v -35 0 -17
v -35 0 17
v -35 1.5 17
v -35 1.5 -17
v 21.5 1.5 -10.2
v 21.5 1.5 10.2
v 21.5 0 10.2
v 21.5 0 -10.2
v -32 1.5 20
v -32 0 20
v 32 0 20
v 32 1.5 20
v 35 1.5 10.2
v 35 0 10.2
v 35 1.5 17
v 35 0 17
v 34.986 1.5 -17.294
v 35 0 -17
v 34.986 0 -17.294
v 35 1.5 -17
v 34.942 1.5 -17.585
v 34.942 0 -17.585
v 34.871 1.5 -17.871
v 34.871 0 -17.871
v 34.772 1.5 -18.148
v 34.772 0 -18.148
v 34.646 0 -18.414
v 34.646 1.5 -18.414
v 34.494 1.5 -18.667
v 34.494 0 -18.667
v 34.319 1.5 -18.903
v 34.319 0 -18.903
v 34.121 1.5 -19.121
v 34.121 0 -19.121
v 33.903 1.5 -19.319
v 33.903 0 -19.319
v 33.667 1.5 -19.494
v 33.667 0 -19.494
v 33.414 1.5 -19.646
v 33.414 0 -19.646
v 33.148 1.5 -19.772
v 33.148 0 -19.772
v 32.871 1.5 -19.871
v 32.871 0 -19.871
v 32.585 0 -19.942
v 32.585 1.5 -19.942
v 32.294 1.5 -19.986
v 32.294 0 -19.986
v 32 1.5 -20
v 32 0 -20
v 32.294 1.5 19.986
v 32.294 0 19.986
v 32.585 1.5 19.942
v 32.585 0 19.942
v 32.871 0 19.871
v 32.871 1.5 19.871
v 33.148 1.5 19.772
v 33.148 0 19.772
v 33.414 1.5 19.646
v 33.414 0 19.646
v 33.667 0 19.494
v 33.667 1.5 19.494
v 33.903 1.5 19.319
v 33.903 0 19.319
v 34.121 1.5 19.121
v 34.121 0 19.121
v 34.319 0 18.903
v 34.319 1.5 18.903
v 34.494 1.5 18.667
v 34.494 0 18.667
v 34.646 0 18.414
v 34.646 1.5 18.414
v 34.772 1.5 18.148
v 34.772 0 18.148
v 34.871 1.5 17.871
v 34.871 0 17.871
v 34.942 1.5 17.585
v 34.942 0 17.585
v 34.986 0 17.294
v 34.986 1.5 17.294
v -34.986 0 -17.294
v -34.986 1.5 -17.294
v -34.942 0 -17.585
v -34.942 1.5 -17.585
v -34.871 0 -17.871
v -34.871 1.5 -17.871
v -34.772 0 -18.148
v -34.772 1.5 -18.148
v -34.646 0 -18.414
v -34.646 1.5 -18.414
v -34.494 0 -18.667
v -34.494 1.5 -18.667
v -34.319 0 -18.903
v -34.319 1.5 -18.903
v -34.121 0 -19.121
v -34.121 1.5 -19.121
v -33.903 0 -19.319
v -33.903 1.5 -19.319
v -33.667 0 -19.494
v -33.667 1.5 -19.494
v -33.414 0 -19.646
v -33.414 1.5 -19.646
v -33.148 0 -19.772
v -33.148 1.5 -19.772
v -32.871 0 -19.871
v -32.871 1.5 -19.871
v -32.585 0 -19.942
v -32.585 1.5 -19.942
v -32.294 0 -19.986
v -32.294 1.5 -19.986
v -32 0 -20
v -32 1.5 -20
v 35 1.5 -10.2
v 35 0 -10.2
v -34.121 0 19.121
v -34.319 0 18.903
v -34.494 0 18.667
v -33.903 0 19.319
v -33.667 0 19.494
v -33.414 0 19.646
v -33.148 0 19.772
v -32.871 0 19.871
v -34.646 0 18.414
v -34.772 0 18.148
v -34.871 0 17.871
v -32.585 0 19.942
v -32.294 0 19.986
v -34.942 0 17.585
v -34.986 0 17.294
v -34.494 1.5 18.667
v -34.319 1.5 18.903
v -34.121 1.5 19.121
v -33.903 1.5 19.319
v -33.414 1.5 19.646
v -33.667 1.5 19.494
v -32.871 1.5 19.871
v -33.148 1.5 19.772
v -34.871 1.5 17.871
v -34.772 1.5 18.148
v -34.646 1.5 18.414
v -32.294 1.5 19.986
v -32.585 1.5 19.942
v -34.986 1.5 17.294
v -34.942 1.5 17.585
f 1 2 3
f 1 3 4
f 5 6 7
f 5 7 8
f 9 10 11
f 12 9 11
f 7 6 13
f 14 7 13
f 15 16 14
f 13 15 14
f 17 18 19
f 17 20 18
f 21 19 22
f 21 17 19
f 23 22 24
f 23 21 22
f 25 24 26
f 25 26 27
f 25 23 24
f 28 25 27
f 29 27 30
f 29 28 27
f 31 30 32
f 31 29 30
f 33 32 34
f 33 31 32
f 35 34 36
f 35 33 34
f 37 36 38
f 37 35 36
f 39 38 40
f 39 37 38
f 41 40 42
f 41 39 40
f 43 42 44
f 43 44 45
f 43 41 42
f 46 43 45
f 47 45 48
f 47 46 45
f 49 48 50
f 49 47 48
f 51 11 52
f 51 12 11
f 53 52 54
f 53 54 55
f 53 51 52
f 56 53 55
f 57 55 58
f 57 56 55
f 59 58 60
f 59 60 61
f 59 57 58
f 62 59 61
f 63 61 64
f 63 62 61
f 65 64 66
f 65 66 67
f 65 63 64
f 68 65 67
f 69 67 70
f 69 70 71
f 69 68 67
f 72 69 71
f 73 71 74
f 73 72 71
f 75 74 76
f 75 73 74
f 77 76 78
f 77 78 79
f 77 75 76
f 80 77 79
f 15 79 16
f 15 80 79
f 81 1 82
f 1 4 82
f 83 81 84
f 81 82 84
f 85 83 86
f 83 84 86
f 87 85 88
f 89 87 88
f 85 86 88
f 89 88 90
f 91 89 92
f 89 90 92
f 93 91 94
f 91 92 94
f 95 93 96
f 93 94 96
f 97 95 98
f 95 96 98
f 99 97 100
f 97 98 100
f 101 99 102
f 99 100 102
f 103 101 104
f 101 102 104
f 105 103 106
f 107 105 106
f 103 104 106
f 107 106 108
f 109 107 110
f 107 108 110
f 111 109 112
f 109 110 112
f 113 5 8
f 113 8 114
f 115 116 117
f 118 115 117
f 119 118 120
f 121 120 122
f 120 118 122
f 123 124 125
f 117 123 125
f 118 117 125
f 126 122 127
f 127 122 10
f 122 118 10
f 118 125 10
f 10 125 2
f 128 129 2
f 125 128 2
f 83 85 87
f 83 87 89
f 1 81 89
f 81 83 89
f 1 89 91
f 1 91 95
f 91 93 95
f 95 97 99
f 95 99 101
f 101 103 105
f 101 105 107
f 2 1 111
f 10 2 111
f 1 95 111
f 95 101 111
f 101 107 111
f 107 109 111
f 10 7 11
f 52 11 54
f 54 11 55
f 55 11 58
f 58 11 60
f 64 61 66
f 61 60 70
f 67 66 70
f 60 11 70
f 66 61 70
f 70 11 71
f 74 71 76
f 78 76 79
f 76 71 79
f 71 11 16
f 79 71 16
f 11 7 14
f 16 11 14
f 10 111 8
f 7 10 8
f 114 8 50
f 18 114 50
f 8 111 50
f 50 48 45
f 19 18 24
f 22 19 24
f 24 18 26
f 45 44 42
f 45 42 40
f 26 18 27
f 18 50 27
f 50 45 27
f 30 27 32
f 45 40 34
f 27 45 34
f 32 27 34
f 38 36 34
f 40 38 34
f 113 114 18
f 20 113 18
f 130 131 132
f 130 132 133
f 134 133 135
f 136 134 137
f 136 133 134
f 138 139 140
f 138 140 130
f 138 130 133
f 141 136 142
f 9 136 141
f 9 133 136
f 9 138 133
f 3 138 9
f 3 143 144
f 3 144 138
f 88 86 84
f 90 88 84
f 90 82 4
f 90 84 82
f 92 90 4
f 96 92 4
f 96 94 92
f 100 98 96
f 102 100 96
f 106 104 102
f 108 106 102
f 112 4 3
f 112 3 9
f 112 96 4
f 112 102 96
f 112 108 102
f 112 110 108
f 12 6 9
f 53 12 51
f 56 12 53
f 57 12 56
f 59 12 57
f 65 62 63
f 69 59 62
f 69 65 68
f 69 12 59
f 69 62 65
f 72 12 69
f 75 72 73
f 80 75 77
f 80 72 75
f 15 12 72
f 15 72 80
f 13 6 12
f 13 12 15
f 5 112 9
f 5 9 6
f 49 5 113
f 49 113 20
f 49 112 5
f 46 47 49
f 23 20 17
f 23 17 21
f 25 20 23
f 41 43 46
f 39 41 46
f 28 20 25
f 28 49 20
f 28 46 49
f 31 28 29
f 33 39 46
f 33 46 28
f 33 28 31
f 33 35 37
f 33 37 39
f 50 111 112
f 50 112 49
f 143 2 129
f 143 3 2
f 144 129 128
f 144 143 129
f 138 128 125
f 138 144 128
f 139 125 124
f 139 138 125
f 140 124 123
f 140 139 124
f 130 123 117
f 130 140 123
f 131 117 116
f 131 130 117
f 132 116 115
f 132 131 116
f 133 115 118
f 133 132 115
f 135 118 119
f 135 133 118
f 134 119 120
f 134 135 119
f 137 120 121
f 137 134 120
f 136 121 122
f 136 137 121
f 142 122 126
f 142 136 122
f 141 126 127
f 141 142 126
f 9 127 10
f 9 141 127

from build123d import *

# Parameters (mm, degrees)
SKETCH_1_W          = 70
SKETCH_1_H          = 40
EXTRUDE_1_DEPTH     = 1.5
FILLET_1_R          = 3
SKETCH_2_W          = 13.5
SKETCH_2_H          = 20.4
CUT_EXTRUDE_1_DEPTH = 41.339186903


with BuildPart() as part:
    # Эскиз1 → Бобышка-Вытянуть1 (new body)
    with BuildSketch(Plane(origin=(0, 0, 0), x_dir=(1, 0, 0), z_dir=(0, 1, 0))):
        Rectangle(SKETCH_1_W, SKETCH_1_H)
    extrude(amount=EXTRUDE_1_DEPTH)

    # Скругление1
    fillet_1_edges = [part.edges().sort_by_distance(p)[0] for p in [
        (-35, 0.75, -20),
        (35, 0.75, -20),
        (35, 0.75, 20),
        (-35, 0.75, 20),
    ]]
    fillet(fillet_1_edges, radius=FILLET_1_R)

    # Эскиз2 → Вырез-Вытянуть1 (cut, through all)
    with BuildSketch(Plane(origin=(0, 1.5, 0), x_dir=(1, 0, 0), z_dir=(0, 1, 0))):
        with Locations((28.25, 0)):
            Rectangle(SKETCH_2_W, SKETCH_2_H)
    extrude(amount=-CUT_EXTRUDE_1_DEPTH, mode=Mode.SUBTRACT)


solid = part.part
